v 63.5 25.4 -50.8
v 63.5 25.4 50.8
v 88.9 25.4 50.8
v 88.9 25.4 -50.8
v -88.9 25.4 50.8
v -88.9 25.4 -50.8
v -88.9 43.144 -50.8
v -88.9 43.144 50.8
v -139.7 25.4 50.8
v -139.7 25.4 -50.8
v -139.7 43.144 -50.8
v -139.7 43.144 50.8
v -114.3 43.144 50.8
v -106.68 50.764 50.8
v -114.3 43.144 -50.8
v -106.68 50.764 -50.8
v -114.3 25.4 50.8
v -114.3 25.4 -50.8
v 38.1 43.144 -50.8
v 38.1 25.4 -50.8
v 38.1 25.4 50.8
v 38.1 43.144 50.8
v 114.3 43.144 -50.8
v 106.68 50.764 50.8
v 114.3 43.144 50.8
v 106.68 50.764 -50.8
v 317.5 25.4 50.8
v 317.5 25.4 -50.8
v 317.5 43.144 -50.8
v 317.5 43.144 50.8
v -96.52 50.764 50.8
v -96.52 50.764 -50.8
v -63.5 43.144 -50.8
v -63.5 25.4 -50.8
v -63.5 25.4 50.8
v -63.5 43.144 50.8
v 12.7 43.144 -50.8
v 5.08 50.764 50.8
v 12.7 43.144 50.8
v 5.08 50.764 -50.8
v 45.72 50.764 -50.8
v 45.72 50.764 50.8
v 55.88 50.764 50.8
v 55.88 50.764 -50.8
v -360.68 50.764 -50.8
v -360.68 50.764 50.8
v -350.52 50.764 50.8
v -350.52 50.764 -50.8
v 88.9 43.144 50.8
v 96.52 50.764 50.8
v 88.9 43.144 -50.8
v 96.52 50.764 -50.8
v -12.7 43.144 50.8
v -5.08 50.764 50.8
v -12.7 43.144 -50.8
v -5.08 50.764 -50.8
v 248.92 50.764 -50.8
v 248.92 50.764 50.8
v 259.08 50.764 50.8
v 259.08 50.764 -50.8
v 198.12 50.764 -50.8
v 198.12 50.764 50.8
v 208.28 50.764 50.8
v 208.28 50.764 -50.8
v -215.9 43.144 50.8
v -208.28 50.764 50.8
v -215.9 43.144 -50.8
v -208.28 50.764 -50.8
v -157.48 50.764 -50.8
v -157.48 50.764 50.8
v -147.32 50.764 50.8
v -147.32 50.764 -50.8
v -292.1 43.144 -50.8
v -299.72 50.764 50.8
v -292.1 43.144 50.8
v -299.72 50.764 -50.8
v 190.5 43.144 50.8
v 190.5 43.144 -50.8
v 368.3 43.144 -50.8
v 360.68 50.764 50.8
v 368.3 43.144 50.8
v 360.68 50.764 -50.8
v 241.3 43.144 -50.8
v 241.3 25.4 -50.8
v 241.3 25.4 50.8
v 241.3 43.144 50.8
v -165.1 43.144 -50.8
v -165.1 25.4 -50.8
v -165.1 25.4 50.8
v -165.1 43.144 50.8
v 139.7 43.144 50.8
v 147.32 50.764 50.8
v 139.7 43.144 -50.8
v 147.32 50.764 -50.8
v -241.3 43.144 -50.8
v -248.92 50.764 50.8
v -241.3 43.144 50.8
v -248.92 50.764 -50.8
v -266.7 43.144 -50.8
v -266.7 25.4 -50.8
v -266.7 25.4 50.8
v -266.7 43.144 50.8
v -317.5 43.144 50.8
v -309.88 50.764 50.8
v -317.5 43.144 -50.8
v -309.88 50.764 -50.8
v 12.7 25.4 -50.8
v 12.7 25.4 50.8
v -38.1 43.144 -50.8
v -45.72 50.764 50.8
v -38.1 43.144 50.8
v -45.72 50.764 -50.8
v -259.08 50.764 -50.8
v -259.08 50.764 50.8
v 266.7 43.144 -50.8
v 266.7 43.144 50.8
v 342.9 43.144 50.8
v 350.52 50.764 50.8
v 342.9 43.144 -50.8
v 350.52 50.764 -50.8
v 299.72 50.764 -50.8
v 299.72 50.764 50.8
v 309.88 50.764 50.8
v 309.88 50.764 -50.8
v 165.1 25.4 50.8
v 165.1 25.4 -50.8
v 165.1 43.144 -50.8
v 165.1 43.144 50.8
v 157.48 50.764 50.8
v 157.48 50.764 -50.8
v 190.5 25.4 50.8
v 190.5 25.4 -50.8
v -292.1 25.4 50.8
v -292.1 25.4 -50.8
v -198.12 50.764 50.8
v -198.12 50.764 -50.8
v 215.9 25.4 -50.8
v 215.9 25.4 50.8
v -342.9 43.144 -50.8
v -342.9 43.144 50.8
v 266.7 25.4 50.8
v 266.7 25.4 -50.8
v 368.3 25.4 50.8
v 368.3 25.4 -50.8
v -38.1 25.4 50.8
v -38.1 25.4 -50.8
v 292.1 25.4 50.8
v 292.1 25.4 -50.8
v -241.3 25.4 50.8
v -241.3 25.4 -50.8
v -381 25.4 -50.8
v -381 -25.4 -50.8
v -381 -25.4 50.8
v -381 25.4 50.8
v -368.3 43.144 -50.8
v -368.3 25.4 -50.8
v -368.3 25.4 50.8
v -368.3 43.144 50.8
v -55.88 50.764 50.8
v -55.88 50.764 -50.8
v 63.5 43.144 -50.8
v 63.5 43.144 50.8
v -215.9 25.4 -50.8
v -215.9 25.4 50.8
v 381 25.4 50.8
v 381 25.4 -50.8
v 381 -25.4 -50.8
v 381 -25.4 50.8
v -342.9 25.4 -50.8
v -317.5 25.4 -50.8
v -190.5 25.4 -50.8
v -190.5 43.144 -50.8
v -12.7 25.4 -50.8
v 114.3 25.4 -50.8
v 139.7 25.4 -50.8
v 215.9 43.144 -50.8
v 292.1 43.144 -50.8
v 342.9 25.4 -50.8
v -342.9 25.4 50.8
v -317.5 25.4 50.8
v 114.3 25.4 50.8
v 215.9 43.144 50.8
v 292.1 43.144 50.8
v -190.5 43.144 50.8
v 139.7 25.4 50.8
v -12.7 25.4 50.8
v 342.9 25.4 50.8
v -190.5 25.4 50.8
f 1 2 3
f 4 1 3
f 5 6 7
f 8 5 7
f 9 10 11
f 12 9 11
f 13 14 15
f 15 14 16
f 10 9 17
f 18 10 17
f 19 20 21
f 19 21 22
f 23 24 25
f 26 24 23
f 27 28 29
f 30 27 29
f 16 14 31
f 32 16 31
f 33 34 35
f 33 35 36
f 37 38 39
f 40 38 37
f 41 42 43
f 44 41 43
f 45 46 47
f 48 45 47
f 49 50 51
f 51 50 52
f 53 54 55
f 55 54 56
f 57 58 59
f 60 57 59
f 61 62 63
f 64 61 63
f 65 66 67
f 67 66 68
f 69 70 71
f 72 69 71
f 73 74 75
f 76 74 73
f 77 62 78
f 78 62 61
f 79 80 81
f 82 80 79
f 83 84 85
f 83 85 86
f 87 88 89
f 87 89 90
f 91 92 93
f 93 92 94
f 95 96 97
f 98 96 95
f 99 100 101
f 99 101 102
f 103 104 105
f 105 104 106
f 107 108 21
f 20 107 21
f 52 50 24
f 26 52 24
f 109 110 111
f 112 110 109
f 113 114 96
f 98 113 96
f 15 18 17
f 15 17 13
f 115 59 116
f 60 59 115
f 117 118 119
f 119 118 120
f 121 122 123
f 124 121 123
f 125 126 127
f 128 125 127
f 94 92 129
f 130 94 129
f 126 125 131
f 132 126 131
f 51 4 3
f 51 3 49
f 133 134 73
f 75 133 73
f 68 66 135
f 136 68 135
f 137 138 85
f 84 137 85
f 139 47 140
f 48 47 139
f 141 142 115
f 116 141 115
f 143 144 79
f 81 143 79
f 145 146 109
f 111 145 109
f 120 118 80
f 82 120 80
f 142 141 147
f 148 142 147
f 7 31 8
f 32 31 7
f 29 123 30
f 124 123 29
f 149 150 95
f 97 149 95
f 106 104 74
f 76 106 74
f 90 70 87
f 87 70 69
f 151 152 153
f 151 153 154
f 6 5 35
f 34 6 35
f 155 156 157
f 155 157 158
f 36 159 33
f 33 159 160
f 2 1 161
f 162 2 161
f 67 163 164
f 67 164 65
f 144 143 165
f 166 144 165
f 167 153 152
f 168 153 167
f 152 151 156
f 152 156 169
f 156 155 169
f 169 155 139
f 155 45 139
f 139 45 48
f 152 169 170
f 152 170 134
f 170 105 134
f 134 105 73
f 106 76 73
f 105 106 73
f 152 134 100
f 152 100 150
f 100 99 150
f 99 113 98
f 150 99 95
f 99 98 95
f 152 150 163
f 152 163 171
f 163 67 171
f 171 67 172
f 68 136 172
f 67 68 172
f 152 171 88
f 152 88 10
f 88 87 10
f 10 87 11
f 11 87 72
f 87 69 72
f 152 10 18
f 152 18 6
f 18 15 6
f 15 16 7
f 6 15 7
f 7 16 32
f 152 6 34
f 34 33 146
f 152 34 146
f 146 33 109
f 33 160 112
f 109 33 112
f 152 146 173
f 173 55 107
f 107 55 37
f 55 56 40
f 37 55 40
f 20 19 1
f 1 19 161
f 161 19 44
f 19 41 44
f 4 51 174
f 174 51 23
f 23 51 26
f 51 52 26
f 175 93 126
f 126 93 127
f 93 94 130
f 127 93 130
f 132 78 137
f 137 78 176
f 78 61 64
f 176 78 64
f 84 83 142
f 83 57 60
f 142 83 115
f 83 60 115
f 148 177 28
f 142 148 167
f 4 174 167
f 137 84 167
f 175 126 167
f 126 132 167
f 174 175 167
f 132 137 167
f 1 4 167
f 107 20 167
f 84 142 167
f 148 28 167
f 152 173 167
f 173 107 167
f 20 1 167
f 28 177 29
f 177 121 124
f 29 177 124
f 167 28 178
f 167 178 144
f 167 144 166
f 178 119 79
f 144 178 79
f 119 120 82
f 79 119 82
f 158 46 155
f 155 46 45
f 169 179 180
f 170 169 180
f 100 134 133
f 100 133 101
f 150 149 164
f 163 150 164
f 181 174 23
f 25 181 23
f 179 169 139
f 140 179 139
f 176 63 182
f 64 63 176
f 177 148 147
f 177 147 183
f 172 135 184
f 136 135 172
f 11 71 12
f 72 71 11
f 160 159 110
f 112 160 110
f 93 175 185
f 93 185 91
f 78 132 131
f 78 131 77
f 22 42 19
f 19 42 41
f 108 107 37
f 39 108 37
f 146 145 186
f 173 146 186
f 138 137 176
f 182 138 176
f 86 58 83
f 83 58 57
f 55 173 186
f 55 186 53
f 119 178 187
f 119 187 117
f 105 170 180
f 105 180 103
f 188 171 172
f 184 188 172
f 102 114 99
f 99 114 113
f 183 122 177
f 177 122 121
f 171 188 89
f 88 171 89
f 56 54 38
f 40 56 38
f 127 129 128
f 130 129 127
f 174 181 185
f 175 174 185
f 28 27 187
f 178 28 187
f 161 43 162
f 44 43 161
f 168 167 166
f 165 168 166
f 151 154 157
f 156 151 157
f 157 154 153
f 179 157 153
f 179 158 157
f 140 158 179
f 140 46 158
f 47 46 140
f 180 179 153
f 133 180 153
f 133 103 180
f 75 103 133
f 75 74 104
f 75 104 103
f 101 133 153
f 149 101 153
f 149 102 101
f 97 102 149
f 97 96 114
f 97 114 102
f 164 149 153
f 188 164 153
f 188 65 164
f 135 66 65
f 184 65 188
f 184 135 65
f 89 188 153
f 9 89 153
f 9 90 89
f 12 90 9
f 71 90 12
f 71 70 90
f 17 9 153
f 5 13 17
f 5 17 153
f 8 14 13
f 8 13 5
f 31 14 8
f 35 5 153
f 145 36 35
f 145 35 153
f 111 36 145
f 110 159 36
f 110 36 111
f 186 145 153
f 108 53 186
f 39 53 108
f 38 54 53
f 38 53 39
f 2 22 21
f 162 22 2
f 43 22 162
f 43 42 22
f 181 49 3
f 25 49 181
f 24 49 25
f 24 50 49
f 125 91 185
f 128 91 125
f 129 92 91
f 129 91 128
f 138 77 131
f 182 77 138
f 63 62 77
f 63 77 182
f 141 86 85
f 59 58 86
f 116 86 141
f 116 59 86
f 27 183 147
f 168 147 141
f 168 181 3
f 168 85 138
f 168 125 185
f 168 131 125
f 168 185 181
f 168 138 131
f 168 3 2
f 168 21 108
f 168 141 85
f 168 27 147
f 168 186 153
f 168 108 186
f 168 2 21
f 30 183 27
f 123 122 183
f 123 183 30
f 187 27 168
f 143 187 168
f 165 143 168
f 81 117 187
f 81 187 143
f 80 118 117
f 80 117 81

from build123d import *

# Parameters (mm, degrees)
SKETCH1_W           = 762
SKETCH1_H           = 50.8
BOSS_EXTRUDE1_DEPTH = 50.8
SKETCH2_W           = 25.4
SKETCH2_H           = 25.363561455
BOSS_EXTRUDE2_DEPTH = 101.6
CHAMFER1_SIZE       = 7.62


with BuildPart() as part:
    # Sketch1 → Boss-Extrude1 (new body, symmetric)
    with BuildSketch(Plane.XY):
        Rectangle(SKETCH1_W, SKETCH1_H)
    extrude(amount=BOSS_EXTRUDE1_DEPTH, both=True)

    # Sketch2 → Boss-Extrude2 (add, through all)
    with BuildSketch(Plane.XY.offset(50.8)):
        with Locations((-254, 38.081780728)):
            Rectangle(SKETCH2_W, SKETCH2_H)
        with Locations((355.6, 38.081780728)):
            Rectangle(SKETCH2_W, SKETCH2_H)
        with Locations((0, 38.081780728)):
            Rectangle(SKETCH2_W, SKETCH2_H)
        with Locations((50.8, 38.081780728)):
            Rectangle(SKETCH2_W, SKETCH2_H)
        with Locations((101.6, 38.081780728)):
            Rectangle(SKETCH2_W, SKETCH2_H)
        with Locations((152.4, 38.081780728)):
            Rectangle(SKETCH2_W, SKETCH2_H)
        with Locations((203.2, 38.081780728)):
            Rectangle(SKETCH2_W, SKETCH2_H)
        with Locations((254, 38.081780728)):
            Rectangle(SKETCH2_W, SKETCH2_H)
        with Locations((304.8, 38.081780728)):
            Rectangle(SKETCH2_W, SKETCH2_H)
        with Locations((-50.8, 38.081780728)):
            Rectangle(SKETCH2_W, SKETCH2_H)
        with Locations((-101.6, 38.081780728)):
            Rectangle(SKETCH2_W, SKETCH2_H)
        with Locations((-152.4, 38.081780728)):
            Rectangle(SKETCH2_W, SKETCH2_H)
        with Locations((-203.2, 38.081780728)):
            Rectangle(SKETCH2_W, SKETCH2_H)
        with Locations((-304.8, 38.081780728)):
            Rectangle(SKETCH2_W, SKETCH2_H)
        with Locations((-355.6, 38.081780728)):
            Rectangle(SKETCH2_W, SKETCH2_H)
    extrude(amount=-BOSS_EXTRUDE2_DEPTH)

    # Chamfer1
    chamfer1_edges = [part.edges().sort_by_distance(p)[0] for p in [
        (-368.3, 50.763561455, 0),
        (-317.5, 50.763561455, 0),
        (-266.7, 50.763561455, 0),
        (-215.9, 50.763561455, 0),
        (-165.1, 50.763561455, 0),
        (-114.3, 50.763561455, 0),
        (-63.5, 50.763561455, 0),
        (-12.7, 50.763561455, 0),
        (38.1, 50.763561455, 0),
        (88.9, 50.763561455, 0),
        (139.7, 50.763561455, 0),
        (190.5, 50.763561455, 0),
        (241.3, 50.763561455, 0),
        (292.1, 50.763561455, 0),
        (342.9, 50.763561455, 0),
        (368.3, 50.763561455, 0),
        (317.5, 50.763561455, 0),
        (266.7, 50.763561455, 0),
        (215.9, 50.763561455, 0),
        (165.1, 50.763561455, 0),
        (114.3, 50.763561455, 0),
        (63.5, 50.763561455, 0),
        (12.7, 50.763561455, 0),
        (-38.1, 50.763561455, 0),
        (-88.9, 50.763561455, 0),
        (-139.7, 50.763561455, 0),
        (-190.5, 50.763561455, 0),
        (-241.3, 50.763561455, 0),
        (-342.9, 50.763561455, 0),
        (-292.1, 50.763561455, 0),
    ]]
    chamfer(chamfer1_edges, length=CHAMFER1_SIZE)


solid = part.part
